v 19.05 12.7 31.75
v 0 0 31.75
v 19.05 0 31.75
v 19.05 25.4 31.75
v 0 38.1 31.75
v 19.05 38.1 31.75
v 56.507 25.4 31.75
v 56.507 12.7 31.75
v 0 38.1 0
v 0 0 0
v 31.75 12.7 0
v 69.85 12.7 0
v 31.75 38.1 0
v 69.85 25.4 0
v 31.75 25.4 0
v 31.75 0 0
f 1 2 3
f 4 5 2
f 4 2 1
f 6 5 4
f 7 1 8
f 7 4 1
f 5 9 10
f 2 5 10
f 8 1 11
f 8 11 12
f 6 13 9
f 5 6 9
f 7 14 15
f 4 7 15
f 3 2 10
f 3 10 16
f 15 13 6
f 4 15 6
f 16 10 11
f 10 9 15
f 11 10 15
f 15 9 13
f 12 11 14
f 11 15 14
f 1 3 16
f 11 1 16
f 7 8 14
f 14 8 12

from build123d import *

# Parameters (mm, degrees)
F1_DEPTH = 31.75
F3_DEPTH = 25.4
F5_DEPTH = 12.7
F7_DEPTH = 12.7


with BuildPart() as f1:
    # F0 (on Top) → F1 (new body)
    with BuildSketch(Plane.XY):
        Polygon((0, 38.1), (0, 0), (31.75, 0), (31.75, 12.7), (69.85, 12.7), (69.85, 25.4), (31.75, 25.4), (31.75, 38.1), align=None)
    extrude(amount=F1_DEPTH)

    # F2 (on face) → F3 (cut)
    with BuildSketch(Plane.XZ.offset(-12.7)):
        Polygon((69.85, 31.75), (56.507498, 31.75), (69.85, 0), align=None)
    extrude(amount=-F3_DEPTH, mode=Mode.SUBTRACT)

    # F4 (on face) → F5 (cut)
    with BuildSketch(Plane.XZ):
        Polygon((31.75, 31.75), (19.05, 31.75), (31.75, 0), align=None)
    extrude(amount=-F5_DEPTH, mode=Mode.SUBTRACT)

    # F6 (on face) → F7 (cut)
    with BuildSketch(Plane(origin=(0, 38.1, 0), x_dir=(-1, 0, 0), z_dir=(0, 1, 0))):
        Polygon((-31.75, 31.75), (-31.75, 0), (-19.05, 31.75), align=None)
    extrude(amount=-F7_DEPTH, mode=Mode.SUBTRACT)


solid = f1.part
